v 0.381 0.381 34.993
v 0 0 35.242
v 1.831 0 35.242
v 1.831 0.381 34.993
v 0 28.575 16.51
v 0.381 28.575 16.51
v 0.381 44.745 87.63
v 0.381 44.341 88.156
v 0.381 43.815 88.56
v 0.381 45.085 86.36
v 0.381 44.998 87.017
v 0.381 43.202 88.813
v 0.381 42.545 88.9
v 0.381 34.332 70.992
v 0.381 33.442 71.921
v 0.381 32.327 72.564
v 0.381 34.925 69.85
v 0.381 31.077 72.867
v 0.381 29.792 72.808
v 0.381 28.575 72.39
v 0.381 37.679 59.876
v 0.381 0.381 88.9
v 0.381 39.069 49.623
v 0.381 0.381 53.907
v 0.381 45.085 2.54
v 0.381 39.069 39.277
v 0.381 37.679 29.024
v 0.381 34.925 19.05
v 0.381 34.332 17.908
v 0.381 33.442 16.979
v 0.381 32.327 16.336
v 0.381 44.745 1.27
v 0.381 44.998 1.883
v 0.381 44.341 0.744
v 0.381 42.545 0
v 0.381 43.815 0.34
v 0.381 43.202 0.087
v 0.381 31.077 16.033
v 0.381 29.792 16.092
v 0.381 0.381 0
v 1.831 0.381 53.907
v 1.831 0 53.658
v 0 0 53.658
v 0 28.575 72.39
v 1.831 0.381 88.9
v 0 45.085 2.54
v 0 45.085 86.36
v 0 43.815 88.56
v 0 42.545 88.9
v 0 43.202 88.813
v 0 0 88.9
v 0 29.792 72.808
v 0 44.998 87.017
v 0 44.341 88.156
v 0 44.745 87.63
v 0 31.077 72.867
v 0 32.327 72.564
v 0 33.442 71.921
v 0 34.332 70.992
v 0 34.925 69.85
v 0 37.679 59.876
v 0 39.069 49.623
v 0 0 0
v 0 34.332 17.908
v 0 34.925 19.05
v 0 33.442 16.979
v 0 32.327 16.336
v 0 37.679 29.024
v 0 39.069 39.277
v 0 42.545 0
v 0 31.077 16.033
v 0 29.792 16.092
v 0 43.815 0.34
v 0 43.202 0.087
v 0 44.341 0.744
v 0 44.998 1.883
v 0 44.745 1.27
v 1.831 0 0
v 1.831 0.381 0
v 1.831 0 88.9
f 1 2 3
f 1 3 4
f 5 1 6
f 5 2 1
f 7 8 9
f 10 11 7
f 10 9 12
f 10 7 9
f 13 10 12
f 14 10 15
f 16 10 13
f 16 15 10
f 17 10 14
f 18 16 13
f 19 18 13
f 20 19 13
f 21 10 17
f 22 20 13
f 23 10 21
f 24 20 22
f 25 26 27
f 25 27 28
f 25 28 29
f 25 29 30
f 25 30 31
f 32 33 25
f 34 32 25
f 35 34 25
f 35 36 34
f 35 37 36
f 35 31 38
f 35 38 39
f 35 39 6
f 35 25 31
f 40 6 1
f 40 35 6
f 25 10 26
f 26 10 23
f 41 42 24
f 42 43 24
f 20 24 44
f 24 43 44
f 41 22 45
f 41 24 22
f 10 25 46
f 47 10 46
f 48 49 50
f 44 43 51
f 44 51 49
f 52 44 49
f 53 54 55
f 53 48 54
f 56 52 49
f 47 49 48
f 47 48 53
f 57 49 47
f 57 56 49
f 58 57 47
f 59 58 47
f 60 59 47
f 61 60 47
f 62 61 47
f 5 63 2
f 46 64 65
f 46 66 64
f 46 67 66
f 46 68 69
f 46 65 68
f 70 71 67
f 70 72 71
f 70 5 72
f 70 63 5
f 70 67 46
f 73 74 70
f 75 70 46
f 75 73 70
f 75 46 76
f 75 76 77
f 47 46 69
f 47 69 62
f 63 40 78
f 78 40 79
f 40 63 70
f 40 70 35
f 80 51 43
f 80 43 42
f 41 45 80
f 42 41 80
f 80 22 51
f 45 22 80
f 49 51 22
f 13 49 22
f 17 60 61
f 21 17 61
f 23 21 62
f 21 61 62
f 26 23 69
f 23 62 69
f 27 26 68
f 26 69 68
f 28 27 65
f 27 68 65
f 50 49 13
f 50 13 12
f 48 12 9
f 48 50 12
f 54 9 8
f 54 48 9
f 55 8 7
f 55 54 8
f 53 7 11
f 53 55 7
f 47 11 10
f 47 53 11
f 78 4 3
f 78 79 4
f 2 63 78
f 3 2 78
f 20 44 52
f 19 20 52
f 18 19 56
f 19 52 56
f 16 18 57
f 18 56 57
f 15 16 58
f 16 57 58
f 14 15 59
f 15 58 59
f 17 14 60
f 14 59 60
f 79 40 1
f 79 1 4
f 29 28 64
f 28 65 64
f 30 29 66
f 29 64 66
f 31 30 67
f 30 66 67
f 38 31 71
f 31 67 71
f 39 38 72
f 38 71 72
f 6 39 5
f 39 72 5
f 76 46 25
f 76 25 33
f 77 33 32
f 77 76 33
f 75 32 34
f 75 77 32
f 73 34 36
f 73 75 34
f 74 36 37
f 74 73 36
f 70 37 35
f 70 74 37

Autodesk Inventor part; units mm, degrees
ref_plane "YZ Plane" through (0, 0, 0) normal (1, 0, 0) x (0, 1, 0)
ref_plane "XZ Plane" through (0, 0, 0) normal (0, 1, 0) x (-1, 0, 0)
ref_plane "XY Plane" through (0, 0, 0) normal (0, 0, 1) x (1, 0, 0)
sketch "Sketch1" plane through (0, 0, 0) normal (0, 0, 1) x (1, 0, 0)
  line L0 (0, 0) -> (1.8311, 0)
  line L1 (0, 0) -> (0, 45.085)
  line L2 (0.381, 45.085) -> (0.381, 0.381)
  line L3 (0.381, 0.381) -> (1.8311, 0.381)
  line L4 (1.8311, 0.381) -> (1.8311, 0)
  line L5 (0.381, 45.085) -> (0, 45.085)
  dimension "d0" = 1.8311
  dimension "d1" = 45.085
  dimension "d2" = 0.381
extrude "Extrusion1" add sketch "Sketch1" along normal blind 88.9
fillet "Fillet1" radius 2.54 2 edges at (0.1905, 45.085, 88.9) (0.1905, 45.085, 0)
sketch "Sketch2" plane through (0, 0, 0) normal (-1, 0, 0) x (0, 0, 1)
  line L0 (0, 0) -> (88.9, 0) projected
  circle A0 centre (40.005, 0) radius 3.175
  circle A1 centre (48.895, 0) radius 3.2307
  dimension "d6" = 6.35
  dimension "d7" = 8.89
  dimension "d8" = 40.005
extrude "Extrusion2" cut sketch "Sketch2" against normal blind 88.9
sketch "Sketch3" plane through (0, 0, 0) normal (-1, 0, 0) x (0, 0, 1)
  circle A0 centre (20.32, 31.115) radius 3.4925
  circle A1 centre (68.58, 31.115) radius 3.4925
  line L0 (88.9, 42.545) -> (88.9, 0) projected
  line L1 (0, 42.545) -> (0, 0) projected
  line L2 (2.54, 45.085) -> (86.36, 45.085) projected
  dimension "d11" = 6.985
  dimension "d12" = 6.985
  dimension "d13" = 20.32
  dimension "d14" = 20.32
  dimension "d15" = 13.97
  dimension "d16" = 13.97
extrude "Extrusion3" cut sketch "Sketch3" against normal blind 88.9
sketch "Sketch4" plane through (0, 0, 0) normal (-1, 0, 0) x (0, 0, 1)
  line L0 (88.9, 42.545) -> (88.9, 0) projected
  line L1 (0, 42.545) -> (0, 0) projected
  line L2 (2.54, 45.085) -> (86.36, 45.085) projected
  line L3 (53.6575, 0) -> (72.39, 28.575)
  line L4 (35.2425, 0) -> (16.51, 28.575)
  arc A0 (69.85, 34.925) -> (19.05, 34.925) centre (44.45, -37.6219) ccw
  arc A1 (19.05, 34.925) -> (16.51, 28.575) centre (20.5495, 30.6422) ccw
  arc A2 (72.39, 28.575) -> (69.85, 34.925) centre (68.3505, 30.6422) ccw
  line L5 (35.2425, 0) -> (53.6575, 0)
  line L6 (52.1257, 0) -> (88.9, 0) projected
  point P0 (44.45, 39.243)
  dimension "d19" = 35.2425
  dimension "d20" = 35.2425
  dimension "d21" = 16.51
  dimension "d22" = 16.51
  dimension "d23" = 16.51
  dimension "d24" = 16.51
  dimension "d25" = 19.05
  dimension "d26" = 19.05
  dimension "d27" = 10.16
  dimension "d28" = 10.16
  dimension "d29" = 5.842
extrude "Extrusion4" cut sketch "Sketch4" against normal blind 25.4
properties part number "Fin_holed" material "Aluminum 6061"
